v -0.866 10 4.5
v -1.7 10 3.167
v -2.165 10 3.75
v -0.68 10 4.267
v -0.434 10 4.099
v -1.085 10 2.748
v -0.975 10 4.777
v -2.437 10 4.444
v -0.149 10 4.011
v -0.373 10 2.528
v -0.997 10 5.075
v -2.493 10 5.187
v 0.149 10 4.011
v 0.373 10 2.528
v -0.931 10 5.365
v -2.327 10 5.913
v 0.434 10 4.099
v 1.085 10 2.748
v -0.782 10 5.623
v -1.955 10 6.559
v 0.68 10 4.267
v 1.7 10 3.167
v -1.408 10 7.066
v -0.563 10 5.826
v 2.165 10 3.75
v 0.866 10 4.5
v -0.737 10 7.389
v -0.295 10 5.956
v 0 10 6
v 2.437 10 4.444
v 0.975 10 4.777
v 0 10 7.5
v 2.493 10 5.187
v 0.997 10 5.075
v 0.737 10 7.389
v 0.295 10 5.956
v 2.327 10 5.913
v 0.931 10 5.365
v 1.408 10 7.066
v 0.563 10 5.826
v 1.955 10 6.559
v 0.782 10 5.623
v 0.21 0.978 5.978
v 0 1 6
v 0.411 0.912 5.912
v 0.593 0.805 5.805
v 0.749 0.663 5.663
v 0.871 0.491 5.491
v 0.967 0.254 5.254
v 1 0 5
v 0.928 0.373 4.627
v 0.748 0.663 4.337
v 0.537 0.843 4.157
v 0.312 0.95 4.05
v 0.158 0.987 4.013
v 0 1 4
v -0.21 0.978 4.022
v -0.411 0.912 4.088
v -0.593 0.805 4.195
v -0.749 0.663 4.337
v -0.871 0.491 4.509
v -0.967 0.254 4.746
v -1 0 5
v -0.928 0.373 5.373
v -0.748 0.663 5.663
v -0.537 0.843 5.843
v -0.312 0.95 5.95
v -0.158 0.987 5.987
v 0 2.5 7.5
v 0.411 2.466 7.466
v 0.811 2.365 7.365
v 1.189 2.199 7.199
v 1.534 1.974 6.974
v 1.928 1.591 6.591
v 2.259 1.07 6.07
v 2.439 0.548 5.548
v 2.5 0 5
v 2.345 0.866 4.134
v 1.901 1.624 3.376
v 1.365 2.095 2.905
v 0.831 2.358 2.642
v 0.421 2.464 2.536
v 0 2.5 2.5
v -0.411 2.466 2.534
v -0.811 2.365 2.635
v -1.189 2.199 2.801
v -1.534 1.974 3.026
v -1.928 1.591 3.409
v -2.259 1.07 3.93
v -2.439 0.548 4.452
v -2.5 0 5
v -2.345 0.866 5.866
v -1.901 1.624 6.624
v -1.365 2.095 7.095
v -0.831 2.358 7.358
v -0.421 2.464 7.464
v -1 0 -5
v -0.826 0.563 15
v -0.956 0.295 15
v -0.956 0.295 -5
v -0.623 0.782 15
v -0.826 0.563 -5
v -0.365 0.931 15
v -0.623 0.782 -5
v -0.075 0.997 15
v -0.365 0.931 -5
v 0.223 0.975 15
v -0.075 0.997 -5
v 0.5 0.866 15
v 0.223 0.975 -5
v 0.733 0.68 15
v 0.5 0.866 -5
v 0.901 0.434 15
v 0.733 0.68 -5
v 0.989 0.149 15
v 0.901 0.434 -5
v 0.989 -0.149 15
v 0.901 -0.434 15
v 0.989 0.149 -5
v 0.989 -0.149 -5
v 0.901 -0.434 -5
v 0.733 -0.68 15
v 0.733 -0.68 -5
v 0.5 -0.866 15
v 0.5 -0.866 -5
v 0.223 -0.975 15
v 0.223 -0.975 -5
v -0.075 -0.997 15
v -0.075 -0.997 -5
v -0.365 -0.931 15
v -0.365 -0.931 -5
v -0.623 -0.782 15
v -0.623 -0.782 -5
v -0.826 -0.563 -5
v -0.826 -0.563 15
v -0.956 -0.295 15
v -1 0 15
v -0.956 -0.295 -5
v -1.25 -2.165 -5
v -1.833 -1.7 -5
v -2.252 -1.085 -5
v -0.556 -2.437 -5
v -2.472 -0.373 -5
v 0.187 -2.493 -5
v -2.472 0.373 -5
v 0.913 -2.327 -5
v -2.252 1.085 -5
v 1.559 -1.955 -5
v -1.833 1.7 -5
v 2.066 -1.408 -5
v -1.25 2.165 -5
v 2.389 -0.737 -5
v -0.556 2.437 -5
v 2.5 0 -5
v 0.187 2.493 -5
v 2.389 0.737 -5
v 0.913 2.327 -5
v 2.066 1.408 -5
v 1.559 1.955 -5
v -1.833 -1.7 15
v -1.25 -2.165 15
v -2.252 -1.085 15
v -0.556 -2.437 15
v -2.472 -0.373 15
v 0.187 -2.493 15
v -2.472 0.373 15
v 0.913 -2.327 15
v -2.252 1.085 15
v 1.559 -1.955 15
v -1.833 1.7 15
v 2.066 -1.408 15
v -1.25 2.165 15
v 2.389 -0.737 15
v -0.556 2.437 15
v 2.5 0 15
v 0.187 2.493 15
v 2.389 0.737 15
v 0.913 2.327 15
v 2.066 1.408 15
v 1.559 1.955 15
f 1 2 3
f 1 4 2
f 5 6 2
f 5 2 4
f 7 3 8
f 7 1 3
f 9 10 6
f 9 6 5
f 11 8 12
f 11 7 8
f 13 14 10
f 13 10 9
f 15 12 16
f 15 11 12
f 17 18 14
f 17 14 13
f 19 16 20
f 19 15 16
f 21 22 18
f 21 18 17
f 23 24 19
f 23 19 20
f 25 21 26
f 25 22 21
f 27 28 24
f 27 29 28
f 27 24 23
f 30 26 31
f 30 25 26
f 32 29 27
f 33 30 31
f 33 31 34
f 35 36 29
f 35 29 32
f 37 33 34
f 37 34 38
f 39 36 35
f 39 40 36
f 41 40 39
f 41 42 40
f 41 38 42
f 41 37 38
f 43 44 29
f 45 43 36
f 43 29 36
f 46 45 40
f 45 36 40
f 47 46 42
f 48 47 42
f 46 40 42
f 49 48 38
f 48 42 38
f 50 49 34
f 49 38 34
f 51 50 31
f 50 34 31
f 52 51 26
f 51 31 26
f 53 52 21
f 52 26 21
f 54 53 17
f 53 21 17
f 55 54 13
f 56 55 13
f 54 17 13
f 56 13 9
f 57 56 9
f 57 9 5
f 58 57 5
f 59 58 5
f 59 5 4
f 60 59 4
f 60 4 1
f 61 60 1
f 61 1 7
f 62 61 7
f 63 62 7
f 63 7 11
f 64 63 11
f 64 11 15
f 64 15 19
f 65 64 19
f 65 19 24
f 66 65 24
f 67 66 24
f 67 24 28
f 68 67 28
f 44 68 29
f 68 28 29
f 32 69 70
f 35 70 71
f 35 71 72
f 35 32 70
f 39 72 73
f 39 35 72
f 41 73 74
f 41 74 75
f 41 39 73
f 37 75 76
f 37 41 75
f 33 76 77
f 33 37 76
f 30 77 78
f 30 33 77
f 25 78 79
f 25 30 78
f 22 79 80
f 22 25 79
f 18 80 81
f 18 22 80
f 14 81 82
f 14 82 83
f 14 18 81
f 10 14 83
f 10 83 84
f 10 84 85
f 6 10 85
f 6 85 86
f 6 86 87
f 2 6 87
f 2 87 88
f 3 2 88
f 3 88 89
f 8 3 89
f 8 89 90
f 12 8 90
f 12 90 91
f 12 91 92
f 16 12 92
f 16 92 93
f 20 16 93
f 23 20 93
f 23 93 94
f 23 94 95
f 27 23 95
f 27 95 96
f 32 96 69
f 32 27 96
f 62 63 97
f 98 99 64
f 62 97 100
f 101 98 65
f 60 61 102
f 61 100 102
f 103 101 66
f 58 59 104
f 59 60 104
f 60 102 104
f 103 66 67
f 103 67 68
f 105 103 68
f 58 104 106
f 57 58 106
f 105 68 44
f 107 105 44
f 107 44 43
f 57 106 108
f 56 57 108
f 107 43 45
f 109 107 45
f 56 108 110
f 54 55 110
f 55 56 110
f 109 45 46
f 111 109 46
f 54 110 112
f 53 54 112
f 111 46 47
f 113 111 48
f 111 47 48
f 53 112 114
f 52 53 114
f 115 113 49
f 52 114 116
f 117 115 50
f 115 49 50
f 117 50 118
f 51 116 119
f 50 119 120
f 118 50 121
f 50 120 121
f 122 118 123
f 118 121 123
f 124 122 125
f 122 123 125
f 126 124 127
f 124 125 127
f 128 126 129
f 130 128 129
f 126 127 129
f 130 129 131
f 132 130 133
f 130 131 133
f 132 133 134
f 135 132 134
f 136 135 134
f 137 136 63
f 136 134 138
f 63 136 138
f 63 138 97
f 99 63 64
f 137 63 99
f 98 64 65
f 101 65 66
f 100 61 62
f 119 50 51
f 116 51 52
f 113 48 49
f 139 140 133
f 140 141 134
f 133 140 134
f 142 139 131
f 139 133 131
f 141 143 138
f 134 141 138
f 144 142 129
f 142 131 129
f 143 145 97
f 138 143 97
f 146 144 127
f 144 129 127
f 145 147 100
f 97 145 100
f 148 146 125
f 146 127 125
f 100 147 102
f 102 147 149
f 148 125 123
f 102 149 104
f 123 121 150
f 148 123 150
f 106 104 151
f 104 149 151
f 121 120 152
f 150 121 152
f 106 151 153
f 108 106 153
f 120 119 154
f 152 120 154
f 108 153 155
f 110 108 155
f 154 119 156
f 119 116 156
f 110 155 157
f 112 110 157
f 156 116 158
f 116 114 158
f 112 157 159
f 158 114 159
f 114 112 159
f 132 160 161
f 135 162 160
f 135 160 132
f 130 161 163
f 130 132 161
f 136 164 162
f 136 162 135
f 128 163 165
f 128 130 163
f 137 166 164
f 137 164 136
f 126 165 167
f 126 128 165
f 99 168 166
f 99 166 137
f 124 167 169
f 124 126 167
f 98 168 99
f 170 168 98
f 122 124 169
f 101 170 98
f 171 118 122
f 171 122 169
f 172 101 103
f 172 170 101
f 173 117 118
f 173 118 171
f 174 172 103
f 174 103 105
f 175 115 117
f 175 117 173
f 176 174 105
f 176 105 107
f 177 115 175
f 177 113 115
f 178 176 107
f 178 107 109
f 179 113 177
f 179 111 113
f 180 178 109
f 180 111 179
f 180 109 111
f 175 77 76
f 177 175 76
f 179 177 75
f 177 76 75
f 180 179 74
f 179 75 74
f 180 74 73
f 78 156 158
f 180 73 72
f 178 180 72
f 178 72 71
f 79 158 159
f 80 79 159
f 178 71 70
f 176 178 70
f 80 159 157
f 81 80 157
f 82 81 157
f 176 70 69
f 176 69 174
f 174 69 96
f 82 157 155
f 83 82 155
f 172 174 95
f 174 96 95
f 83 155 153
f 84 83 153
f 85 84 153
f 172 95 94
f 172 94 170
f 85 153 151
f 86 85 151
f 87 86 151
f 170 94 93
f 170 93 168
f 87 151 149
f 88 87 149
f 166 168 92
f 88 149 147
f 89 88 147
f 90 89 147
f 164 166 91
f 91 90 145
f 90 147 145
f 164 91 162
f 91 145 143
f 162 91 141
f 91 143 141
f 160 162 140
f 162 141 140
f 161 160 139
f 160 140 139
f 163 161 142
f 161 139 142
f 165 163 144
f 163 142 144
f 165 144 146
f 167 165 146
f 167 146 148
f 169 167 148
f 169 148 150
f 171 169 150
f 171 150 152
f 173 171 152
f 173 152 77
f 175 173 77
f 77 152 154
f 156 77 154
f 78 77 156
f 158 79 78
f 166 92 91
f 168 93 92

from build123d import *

# Parameters (mm, degrees)
EXTRUDE_1_DEPTH          = 15
EXTRUDE_1_DEPTH_BACK     = 5
SKETCH_1_R               = 2.5
EXTRUDE_2_REACH          = 21.685
EXTRUDE_2_END_RADIUS     = 2.5
SKETCH_3_R               = 2.5
CUT_EXTRUDE_1_REACH      = 24.5
SKETCH_6_R               = 1
CUT_EXTRUDE_3_REACH      = 21.685
CUT_EXTRUDE_3_END_RADIUS = 1
SKETCH_7_R               = 1


with BuildPart() as part:
    # 草图1 → 凸台-拉伸1 (new, two sides: drawn at the far end of the back side and taken through both)
    with BuildSketch(Plane.XY.offset(-EXTRUDE_1_DEPTH_BACK)):
        Circle(SKETCH_1_R)
    extrude(amount=EXTRUDE_1_DEPTH + EXTRUDE_1_DEPTH_BACK)

    # 凸台-拉伸2: up to this cylinder (the profile starts outside it)
    extrude_2_end = Plane(origin=(0, 0, 5), z_dir=(0, 0, 1)) * Cylinder(EXTRUDE_2_END_RADIUS, 49.37, mode=Mode.PRIVATE)
    # 草图3 → 凸台-拉伸2 (add, up to the surface)
    with BuildSketch(Plane(origin=(0, 10, 0), x_dir=(1, 0, 0), z_dir=(0, 1, 0)), mode=Mode.PRIVATE) as extrude_2_sk1:
        with Locations(Location((0, -5, 0), (0, 0, 270))):
            Circle(SKETCH_3_R)
    extrude_2_tool1 = extrude(extrude_2_sk1.sketch, amount=-EXTRUDE_2_REACH, mode=Mode.PRIVATE) - extrude_2_end
    add(extrude_2_tool1.solids().sort_by_distance((0, 10, 5))[0])

    # 草图6 → 切除-拉伸1 (cut, up to next)
    with BuildSketch(Plane(origin=(0, 0, -5), x_dir=(-1, 0, 0), z_dir=(0, 0, -1)), mode=Mode.PRIVATE) as cut_extrude_1_sk1:
        Circle(SKETCH_6_R)
    cut_extrude_1_tool1 = extrude(cut_extrude_1_sk1.sketch, amount=-CUT_EXTRUDE_1_REACH, mode=Mode.PRIVATE) & part.part
    add(cut_extrude_1_tool1.solids().sort_by_distance((0, 0, -5))[0], mode=Mode.SUBTRACT)

    # 切除-拉伸3: up to this cylinder (the profile starts outside it)
    cut_extrude_3_end = Plane(origin=(0, 0, 5), z_dir=(0, 0, -1)) * Cylinder(CUT_EXTRUDE_3_END_RADIUS, 46.37, mode=Mode.PRIVATE)
    # 草图7 → 切除-拉伸3 (cut, up to the surface)
    with BuildSketch(Plane(origin=(0, 10, 0), x_dir=(1, 0, 0), z_dir=(0, 1, 0)), mode=Mode.PRIVATE) as cut_extrude_3_sk1:
        with Locations(Location((0, -5, 0), (0, 0, 270))):
            Circle(SKETCH_7_R)
    cut_extrude_3_tool1 = extrude(cut_extrude_3_sk1.sketch, amount=-CUT_EXTRUDE_3_REACH, mode=Mode.PRIVATE) - cut_extrude_3_end
    add(cut_extrude_3_tool1.solids().sort_by_distance((0, 10, 5))[0], mode=Mode.SUBTRACT)


solid = part.part
